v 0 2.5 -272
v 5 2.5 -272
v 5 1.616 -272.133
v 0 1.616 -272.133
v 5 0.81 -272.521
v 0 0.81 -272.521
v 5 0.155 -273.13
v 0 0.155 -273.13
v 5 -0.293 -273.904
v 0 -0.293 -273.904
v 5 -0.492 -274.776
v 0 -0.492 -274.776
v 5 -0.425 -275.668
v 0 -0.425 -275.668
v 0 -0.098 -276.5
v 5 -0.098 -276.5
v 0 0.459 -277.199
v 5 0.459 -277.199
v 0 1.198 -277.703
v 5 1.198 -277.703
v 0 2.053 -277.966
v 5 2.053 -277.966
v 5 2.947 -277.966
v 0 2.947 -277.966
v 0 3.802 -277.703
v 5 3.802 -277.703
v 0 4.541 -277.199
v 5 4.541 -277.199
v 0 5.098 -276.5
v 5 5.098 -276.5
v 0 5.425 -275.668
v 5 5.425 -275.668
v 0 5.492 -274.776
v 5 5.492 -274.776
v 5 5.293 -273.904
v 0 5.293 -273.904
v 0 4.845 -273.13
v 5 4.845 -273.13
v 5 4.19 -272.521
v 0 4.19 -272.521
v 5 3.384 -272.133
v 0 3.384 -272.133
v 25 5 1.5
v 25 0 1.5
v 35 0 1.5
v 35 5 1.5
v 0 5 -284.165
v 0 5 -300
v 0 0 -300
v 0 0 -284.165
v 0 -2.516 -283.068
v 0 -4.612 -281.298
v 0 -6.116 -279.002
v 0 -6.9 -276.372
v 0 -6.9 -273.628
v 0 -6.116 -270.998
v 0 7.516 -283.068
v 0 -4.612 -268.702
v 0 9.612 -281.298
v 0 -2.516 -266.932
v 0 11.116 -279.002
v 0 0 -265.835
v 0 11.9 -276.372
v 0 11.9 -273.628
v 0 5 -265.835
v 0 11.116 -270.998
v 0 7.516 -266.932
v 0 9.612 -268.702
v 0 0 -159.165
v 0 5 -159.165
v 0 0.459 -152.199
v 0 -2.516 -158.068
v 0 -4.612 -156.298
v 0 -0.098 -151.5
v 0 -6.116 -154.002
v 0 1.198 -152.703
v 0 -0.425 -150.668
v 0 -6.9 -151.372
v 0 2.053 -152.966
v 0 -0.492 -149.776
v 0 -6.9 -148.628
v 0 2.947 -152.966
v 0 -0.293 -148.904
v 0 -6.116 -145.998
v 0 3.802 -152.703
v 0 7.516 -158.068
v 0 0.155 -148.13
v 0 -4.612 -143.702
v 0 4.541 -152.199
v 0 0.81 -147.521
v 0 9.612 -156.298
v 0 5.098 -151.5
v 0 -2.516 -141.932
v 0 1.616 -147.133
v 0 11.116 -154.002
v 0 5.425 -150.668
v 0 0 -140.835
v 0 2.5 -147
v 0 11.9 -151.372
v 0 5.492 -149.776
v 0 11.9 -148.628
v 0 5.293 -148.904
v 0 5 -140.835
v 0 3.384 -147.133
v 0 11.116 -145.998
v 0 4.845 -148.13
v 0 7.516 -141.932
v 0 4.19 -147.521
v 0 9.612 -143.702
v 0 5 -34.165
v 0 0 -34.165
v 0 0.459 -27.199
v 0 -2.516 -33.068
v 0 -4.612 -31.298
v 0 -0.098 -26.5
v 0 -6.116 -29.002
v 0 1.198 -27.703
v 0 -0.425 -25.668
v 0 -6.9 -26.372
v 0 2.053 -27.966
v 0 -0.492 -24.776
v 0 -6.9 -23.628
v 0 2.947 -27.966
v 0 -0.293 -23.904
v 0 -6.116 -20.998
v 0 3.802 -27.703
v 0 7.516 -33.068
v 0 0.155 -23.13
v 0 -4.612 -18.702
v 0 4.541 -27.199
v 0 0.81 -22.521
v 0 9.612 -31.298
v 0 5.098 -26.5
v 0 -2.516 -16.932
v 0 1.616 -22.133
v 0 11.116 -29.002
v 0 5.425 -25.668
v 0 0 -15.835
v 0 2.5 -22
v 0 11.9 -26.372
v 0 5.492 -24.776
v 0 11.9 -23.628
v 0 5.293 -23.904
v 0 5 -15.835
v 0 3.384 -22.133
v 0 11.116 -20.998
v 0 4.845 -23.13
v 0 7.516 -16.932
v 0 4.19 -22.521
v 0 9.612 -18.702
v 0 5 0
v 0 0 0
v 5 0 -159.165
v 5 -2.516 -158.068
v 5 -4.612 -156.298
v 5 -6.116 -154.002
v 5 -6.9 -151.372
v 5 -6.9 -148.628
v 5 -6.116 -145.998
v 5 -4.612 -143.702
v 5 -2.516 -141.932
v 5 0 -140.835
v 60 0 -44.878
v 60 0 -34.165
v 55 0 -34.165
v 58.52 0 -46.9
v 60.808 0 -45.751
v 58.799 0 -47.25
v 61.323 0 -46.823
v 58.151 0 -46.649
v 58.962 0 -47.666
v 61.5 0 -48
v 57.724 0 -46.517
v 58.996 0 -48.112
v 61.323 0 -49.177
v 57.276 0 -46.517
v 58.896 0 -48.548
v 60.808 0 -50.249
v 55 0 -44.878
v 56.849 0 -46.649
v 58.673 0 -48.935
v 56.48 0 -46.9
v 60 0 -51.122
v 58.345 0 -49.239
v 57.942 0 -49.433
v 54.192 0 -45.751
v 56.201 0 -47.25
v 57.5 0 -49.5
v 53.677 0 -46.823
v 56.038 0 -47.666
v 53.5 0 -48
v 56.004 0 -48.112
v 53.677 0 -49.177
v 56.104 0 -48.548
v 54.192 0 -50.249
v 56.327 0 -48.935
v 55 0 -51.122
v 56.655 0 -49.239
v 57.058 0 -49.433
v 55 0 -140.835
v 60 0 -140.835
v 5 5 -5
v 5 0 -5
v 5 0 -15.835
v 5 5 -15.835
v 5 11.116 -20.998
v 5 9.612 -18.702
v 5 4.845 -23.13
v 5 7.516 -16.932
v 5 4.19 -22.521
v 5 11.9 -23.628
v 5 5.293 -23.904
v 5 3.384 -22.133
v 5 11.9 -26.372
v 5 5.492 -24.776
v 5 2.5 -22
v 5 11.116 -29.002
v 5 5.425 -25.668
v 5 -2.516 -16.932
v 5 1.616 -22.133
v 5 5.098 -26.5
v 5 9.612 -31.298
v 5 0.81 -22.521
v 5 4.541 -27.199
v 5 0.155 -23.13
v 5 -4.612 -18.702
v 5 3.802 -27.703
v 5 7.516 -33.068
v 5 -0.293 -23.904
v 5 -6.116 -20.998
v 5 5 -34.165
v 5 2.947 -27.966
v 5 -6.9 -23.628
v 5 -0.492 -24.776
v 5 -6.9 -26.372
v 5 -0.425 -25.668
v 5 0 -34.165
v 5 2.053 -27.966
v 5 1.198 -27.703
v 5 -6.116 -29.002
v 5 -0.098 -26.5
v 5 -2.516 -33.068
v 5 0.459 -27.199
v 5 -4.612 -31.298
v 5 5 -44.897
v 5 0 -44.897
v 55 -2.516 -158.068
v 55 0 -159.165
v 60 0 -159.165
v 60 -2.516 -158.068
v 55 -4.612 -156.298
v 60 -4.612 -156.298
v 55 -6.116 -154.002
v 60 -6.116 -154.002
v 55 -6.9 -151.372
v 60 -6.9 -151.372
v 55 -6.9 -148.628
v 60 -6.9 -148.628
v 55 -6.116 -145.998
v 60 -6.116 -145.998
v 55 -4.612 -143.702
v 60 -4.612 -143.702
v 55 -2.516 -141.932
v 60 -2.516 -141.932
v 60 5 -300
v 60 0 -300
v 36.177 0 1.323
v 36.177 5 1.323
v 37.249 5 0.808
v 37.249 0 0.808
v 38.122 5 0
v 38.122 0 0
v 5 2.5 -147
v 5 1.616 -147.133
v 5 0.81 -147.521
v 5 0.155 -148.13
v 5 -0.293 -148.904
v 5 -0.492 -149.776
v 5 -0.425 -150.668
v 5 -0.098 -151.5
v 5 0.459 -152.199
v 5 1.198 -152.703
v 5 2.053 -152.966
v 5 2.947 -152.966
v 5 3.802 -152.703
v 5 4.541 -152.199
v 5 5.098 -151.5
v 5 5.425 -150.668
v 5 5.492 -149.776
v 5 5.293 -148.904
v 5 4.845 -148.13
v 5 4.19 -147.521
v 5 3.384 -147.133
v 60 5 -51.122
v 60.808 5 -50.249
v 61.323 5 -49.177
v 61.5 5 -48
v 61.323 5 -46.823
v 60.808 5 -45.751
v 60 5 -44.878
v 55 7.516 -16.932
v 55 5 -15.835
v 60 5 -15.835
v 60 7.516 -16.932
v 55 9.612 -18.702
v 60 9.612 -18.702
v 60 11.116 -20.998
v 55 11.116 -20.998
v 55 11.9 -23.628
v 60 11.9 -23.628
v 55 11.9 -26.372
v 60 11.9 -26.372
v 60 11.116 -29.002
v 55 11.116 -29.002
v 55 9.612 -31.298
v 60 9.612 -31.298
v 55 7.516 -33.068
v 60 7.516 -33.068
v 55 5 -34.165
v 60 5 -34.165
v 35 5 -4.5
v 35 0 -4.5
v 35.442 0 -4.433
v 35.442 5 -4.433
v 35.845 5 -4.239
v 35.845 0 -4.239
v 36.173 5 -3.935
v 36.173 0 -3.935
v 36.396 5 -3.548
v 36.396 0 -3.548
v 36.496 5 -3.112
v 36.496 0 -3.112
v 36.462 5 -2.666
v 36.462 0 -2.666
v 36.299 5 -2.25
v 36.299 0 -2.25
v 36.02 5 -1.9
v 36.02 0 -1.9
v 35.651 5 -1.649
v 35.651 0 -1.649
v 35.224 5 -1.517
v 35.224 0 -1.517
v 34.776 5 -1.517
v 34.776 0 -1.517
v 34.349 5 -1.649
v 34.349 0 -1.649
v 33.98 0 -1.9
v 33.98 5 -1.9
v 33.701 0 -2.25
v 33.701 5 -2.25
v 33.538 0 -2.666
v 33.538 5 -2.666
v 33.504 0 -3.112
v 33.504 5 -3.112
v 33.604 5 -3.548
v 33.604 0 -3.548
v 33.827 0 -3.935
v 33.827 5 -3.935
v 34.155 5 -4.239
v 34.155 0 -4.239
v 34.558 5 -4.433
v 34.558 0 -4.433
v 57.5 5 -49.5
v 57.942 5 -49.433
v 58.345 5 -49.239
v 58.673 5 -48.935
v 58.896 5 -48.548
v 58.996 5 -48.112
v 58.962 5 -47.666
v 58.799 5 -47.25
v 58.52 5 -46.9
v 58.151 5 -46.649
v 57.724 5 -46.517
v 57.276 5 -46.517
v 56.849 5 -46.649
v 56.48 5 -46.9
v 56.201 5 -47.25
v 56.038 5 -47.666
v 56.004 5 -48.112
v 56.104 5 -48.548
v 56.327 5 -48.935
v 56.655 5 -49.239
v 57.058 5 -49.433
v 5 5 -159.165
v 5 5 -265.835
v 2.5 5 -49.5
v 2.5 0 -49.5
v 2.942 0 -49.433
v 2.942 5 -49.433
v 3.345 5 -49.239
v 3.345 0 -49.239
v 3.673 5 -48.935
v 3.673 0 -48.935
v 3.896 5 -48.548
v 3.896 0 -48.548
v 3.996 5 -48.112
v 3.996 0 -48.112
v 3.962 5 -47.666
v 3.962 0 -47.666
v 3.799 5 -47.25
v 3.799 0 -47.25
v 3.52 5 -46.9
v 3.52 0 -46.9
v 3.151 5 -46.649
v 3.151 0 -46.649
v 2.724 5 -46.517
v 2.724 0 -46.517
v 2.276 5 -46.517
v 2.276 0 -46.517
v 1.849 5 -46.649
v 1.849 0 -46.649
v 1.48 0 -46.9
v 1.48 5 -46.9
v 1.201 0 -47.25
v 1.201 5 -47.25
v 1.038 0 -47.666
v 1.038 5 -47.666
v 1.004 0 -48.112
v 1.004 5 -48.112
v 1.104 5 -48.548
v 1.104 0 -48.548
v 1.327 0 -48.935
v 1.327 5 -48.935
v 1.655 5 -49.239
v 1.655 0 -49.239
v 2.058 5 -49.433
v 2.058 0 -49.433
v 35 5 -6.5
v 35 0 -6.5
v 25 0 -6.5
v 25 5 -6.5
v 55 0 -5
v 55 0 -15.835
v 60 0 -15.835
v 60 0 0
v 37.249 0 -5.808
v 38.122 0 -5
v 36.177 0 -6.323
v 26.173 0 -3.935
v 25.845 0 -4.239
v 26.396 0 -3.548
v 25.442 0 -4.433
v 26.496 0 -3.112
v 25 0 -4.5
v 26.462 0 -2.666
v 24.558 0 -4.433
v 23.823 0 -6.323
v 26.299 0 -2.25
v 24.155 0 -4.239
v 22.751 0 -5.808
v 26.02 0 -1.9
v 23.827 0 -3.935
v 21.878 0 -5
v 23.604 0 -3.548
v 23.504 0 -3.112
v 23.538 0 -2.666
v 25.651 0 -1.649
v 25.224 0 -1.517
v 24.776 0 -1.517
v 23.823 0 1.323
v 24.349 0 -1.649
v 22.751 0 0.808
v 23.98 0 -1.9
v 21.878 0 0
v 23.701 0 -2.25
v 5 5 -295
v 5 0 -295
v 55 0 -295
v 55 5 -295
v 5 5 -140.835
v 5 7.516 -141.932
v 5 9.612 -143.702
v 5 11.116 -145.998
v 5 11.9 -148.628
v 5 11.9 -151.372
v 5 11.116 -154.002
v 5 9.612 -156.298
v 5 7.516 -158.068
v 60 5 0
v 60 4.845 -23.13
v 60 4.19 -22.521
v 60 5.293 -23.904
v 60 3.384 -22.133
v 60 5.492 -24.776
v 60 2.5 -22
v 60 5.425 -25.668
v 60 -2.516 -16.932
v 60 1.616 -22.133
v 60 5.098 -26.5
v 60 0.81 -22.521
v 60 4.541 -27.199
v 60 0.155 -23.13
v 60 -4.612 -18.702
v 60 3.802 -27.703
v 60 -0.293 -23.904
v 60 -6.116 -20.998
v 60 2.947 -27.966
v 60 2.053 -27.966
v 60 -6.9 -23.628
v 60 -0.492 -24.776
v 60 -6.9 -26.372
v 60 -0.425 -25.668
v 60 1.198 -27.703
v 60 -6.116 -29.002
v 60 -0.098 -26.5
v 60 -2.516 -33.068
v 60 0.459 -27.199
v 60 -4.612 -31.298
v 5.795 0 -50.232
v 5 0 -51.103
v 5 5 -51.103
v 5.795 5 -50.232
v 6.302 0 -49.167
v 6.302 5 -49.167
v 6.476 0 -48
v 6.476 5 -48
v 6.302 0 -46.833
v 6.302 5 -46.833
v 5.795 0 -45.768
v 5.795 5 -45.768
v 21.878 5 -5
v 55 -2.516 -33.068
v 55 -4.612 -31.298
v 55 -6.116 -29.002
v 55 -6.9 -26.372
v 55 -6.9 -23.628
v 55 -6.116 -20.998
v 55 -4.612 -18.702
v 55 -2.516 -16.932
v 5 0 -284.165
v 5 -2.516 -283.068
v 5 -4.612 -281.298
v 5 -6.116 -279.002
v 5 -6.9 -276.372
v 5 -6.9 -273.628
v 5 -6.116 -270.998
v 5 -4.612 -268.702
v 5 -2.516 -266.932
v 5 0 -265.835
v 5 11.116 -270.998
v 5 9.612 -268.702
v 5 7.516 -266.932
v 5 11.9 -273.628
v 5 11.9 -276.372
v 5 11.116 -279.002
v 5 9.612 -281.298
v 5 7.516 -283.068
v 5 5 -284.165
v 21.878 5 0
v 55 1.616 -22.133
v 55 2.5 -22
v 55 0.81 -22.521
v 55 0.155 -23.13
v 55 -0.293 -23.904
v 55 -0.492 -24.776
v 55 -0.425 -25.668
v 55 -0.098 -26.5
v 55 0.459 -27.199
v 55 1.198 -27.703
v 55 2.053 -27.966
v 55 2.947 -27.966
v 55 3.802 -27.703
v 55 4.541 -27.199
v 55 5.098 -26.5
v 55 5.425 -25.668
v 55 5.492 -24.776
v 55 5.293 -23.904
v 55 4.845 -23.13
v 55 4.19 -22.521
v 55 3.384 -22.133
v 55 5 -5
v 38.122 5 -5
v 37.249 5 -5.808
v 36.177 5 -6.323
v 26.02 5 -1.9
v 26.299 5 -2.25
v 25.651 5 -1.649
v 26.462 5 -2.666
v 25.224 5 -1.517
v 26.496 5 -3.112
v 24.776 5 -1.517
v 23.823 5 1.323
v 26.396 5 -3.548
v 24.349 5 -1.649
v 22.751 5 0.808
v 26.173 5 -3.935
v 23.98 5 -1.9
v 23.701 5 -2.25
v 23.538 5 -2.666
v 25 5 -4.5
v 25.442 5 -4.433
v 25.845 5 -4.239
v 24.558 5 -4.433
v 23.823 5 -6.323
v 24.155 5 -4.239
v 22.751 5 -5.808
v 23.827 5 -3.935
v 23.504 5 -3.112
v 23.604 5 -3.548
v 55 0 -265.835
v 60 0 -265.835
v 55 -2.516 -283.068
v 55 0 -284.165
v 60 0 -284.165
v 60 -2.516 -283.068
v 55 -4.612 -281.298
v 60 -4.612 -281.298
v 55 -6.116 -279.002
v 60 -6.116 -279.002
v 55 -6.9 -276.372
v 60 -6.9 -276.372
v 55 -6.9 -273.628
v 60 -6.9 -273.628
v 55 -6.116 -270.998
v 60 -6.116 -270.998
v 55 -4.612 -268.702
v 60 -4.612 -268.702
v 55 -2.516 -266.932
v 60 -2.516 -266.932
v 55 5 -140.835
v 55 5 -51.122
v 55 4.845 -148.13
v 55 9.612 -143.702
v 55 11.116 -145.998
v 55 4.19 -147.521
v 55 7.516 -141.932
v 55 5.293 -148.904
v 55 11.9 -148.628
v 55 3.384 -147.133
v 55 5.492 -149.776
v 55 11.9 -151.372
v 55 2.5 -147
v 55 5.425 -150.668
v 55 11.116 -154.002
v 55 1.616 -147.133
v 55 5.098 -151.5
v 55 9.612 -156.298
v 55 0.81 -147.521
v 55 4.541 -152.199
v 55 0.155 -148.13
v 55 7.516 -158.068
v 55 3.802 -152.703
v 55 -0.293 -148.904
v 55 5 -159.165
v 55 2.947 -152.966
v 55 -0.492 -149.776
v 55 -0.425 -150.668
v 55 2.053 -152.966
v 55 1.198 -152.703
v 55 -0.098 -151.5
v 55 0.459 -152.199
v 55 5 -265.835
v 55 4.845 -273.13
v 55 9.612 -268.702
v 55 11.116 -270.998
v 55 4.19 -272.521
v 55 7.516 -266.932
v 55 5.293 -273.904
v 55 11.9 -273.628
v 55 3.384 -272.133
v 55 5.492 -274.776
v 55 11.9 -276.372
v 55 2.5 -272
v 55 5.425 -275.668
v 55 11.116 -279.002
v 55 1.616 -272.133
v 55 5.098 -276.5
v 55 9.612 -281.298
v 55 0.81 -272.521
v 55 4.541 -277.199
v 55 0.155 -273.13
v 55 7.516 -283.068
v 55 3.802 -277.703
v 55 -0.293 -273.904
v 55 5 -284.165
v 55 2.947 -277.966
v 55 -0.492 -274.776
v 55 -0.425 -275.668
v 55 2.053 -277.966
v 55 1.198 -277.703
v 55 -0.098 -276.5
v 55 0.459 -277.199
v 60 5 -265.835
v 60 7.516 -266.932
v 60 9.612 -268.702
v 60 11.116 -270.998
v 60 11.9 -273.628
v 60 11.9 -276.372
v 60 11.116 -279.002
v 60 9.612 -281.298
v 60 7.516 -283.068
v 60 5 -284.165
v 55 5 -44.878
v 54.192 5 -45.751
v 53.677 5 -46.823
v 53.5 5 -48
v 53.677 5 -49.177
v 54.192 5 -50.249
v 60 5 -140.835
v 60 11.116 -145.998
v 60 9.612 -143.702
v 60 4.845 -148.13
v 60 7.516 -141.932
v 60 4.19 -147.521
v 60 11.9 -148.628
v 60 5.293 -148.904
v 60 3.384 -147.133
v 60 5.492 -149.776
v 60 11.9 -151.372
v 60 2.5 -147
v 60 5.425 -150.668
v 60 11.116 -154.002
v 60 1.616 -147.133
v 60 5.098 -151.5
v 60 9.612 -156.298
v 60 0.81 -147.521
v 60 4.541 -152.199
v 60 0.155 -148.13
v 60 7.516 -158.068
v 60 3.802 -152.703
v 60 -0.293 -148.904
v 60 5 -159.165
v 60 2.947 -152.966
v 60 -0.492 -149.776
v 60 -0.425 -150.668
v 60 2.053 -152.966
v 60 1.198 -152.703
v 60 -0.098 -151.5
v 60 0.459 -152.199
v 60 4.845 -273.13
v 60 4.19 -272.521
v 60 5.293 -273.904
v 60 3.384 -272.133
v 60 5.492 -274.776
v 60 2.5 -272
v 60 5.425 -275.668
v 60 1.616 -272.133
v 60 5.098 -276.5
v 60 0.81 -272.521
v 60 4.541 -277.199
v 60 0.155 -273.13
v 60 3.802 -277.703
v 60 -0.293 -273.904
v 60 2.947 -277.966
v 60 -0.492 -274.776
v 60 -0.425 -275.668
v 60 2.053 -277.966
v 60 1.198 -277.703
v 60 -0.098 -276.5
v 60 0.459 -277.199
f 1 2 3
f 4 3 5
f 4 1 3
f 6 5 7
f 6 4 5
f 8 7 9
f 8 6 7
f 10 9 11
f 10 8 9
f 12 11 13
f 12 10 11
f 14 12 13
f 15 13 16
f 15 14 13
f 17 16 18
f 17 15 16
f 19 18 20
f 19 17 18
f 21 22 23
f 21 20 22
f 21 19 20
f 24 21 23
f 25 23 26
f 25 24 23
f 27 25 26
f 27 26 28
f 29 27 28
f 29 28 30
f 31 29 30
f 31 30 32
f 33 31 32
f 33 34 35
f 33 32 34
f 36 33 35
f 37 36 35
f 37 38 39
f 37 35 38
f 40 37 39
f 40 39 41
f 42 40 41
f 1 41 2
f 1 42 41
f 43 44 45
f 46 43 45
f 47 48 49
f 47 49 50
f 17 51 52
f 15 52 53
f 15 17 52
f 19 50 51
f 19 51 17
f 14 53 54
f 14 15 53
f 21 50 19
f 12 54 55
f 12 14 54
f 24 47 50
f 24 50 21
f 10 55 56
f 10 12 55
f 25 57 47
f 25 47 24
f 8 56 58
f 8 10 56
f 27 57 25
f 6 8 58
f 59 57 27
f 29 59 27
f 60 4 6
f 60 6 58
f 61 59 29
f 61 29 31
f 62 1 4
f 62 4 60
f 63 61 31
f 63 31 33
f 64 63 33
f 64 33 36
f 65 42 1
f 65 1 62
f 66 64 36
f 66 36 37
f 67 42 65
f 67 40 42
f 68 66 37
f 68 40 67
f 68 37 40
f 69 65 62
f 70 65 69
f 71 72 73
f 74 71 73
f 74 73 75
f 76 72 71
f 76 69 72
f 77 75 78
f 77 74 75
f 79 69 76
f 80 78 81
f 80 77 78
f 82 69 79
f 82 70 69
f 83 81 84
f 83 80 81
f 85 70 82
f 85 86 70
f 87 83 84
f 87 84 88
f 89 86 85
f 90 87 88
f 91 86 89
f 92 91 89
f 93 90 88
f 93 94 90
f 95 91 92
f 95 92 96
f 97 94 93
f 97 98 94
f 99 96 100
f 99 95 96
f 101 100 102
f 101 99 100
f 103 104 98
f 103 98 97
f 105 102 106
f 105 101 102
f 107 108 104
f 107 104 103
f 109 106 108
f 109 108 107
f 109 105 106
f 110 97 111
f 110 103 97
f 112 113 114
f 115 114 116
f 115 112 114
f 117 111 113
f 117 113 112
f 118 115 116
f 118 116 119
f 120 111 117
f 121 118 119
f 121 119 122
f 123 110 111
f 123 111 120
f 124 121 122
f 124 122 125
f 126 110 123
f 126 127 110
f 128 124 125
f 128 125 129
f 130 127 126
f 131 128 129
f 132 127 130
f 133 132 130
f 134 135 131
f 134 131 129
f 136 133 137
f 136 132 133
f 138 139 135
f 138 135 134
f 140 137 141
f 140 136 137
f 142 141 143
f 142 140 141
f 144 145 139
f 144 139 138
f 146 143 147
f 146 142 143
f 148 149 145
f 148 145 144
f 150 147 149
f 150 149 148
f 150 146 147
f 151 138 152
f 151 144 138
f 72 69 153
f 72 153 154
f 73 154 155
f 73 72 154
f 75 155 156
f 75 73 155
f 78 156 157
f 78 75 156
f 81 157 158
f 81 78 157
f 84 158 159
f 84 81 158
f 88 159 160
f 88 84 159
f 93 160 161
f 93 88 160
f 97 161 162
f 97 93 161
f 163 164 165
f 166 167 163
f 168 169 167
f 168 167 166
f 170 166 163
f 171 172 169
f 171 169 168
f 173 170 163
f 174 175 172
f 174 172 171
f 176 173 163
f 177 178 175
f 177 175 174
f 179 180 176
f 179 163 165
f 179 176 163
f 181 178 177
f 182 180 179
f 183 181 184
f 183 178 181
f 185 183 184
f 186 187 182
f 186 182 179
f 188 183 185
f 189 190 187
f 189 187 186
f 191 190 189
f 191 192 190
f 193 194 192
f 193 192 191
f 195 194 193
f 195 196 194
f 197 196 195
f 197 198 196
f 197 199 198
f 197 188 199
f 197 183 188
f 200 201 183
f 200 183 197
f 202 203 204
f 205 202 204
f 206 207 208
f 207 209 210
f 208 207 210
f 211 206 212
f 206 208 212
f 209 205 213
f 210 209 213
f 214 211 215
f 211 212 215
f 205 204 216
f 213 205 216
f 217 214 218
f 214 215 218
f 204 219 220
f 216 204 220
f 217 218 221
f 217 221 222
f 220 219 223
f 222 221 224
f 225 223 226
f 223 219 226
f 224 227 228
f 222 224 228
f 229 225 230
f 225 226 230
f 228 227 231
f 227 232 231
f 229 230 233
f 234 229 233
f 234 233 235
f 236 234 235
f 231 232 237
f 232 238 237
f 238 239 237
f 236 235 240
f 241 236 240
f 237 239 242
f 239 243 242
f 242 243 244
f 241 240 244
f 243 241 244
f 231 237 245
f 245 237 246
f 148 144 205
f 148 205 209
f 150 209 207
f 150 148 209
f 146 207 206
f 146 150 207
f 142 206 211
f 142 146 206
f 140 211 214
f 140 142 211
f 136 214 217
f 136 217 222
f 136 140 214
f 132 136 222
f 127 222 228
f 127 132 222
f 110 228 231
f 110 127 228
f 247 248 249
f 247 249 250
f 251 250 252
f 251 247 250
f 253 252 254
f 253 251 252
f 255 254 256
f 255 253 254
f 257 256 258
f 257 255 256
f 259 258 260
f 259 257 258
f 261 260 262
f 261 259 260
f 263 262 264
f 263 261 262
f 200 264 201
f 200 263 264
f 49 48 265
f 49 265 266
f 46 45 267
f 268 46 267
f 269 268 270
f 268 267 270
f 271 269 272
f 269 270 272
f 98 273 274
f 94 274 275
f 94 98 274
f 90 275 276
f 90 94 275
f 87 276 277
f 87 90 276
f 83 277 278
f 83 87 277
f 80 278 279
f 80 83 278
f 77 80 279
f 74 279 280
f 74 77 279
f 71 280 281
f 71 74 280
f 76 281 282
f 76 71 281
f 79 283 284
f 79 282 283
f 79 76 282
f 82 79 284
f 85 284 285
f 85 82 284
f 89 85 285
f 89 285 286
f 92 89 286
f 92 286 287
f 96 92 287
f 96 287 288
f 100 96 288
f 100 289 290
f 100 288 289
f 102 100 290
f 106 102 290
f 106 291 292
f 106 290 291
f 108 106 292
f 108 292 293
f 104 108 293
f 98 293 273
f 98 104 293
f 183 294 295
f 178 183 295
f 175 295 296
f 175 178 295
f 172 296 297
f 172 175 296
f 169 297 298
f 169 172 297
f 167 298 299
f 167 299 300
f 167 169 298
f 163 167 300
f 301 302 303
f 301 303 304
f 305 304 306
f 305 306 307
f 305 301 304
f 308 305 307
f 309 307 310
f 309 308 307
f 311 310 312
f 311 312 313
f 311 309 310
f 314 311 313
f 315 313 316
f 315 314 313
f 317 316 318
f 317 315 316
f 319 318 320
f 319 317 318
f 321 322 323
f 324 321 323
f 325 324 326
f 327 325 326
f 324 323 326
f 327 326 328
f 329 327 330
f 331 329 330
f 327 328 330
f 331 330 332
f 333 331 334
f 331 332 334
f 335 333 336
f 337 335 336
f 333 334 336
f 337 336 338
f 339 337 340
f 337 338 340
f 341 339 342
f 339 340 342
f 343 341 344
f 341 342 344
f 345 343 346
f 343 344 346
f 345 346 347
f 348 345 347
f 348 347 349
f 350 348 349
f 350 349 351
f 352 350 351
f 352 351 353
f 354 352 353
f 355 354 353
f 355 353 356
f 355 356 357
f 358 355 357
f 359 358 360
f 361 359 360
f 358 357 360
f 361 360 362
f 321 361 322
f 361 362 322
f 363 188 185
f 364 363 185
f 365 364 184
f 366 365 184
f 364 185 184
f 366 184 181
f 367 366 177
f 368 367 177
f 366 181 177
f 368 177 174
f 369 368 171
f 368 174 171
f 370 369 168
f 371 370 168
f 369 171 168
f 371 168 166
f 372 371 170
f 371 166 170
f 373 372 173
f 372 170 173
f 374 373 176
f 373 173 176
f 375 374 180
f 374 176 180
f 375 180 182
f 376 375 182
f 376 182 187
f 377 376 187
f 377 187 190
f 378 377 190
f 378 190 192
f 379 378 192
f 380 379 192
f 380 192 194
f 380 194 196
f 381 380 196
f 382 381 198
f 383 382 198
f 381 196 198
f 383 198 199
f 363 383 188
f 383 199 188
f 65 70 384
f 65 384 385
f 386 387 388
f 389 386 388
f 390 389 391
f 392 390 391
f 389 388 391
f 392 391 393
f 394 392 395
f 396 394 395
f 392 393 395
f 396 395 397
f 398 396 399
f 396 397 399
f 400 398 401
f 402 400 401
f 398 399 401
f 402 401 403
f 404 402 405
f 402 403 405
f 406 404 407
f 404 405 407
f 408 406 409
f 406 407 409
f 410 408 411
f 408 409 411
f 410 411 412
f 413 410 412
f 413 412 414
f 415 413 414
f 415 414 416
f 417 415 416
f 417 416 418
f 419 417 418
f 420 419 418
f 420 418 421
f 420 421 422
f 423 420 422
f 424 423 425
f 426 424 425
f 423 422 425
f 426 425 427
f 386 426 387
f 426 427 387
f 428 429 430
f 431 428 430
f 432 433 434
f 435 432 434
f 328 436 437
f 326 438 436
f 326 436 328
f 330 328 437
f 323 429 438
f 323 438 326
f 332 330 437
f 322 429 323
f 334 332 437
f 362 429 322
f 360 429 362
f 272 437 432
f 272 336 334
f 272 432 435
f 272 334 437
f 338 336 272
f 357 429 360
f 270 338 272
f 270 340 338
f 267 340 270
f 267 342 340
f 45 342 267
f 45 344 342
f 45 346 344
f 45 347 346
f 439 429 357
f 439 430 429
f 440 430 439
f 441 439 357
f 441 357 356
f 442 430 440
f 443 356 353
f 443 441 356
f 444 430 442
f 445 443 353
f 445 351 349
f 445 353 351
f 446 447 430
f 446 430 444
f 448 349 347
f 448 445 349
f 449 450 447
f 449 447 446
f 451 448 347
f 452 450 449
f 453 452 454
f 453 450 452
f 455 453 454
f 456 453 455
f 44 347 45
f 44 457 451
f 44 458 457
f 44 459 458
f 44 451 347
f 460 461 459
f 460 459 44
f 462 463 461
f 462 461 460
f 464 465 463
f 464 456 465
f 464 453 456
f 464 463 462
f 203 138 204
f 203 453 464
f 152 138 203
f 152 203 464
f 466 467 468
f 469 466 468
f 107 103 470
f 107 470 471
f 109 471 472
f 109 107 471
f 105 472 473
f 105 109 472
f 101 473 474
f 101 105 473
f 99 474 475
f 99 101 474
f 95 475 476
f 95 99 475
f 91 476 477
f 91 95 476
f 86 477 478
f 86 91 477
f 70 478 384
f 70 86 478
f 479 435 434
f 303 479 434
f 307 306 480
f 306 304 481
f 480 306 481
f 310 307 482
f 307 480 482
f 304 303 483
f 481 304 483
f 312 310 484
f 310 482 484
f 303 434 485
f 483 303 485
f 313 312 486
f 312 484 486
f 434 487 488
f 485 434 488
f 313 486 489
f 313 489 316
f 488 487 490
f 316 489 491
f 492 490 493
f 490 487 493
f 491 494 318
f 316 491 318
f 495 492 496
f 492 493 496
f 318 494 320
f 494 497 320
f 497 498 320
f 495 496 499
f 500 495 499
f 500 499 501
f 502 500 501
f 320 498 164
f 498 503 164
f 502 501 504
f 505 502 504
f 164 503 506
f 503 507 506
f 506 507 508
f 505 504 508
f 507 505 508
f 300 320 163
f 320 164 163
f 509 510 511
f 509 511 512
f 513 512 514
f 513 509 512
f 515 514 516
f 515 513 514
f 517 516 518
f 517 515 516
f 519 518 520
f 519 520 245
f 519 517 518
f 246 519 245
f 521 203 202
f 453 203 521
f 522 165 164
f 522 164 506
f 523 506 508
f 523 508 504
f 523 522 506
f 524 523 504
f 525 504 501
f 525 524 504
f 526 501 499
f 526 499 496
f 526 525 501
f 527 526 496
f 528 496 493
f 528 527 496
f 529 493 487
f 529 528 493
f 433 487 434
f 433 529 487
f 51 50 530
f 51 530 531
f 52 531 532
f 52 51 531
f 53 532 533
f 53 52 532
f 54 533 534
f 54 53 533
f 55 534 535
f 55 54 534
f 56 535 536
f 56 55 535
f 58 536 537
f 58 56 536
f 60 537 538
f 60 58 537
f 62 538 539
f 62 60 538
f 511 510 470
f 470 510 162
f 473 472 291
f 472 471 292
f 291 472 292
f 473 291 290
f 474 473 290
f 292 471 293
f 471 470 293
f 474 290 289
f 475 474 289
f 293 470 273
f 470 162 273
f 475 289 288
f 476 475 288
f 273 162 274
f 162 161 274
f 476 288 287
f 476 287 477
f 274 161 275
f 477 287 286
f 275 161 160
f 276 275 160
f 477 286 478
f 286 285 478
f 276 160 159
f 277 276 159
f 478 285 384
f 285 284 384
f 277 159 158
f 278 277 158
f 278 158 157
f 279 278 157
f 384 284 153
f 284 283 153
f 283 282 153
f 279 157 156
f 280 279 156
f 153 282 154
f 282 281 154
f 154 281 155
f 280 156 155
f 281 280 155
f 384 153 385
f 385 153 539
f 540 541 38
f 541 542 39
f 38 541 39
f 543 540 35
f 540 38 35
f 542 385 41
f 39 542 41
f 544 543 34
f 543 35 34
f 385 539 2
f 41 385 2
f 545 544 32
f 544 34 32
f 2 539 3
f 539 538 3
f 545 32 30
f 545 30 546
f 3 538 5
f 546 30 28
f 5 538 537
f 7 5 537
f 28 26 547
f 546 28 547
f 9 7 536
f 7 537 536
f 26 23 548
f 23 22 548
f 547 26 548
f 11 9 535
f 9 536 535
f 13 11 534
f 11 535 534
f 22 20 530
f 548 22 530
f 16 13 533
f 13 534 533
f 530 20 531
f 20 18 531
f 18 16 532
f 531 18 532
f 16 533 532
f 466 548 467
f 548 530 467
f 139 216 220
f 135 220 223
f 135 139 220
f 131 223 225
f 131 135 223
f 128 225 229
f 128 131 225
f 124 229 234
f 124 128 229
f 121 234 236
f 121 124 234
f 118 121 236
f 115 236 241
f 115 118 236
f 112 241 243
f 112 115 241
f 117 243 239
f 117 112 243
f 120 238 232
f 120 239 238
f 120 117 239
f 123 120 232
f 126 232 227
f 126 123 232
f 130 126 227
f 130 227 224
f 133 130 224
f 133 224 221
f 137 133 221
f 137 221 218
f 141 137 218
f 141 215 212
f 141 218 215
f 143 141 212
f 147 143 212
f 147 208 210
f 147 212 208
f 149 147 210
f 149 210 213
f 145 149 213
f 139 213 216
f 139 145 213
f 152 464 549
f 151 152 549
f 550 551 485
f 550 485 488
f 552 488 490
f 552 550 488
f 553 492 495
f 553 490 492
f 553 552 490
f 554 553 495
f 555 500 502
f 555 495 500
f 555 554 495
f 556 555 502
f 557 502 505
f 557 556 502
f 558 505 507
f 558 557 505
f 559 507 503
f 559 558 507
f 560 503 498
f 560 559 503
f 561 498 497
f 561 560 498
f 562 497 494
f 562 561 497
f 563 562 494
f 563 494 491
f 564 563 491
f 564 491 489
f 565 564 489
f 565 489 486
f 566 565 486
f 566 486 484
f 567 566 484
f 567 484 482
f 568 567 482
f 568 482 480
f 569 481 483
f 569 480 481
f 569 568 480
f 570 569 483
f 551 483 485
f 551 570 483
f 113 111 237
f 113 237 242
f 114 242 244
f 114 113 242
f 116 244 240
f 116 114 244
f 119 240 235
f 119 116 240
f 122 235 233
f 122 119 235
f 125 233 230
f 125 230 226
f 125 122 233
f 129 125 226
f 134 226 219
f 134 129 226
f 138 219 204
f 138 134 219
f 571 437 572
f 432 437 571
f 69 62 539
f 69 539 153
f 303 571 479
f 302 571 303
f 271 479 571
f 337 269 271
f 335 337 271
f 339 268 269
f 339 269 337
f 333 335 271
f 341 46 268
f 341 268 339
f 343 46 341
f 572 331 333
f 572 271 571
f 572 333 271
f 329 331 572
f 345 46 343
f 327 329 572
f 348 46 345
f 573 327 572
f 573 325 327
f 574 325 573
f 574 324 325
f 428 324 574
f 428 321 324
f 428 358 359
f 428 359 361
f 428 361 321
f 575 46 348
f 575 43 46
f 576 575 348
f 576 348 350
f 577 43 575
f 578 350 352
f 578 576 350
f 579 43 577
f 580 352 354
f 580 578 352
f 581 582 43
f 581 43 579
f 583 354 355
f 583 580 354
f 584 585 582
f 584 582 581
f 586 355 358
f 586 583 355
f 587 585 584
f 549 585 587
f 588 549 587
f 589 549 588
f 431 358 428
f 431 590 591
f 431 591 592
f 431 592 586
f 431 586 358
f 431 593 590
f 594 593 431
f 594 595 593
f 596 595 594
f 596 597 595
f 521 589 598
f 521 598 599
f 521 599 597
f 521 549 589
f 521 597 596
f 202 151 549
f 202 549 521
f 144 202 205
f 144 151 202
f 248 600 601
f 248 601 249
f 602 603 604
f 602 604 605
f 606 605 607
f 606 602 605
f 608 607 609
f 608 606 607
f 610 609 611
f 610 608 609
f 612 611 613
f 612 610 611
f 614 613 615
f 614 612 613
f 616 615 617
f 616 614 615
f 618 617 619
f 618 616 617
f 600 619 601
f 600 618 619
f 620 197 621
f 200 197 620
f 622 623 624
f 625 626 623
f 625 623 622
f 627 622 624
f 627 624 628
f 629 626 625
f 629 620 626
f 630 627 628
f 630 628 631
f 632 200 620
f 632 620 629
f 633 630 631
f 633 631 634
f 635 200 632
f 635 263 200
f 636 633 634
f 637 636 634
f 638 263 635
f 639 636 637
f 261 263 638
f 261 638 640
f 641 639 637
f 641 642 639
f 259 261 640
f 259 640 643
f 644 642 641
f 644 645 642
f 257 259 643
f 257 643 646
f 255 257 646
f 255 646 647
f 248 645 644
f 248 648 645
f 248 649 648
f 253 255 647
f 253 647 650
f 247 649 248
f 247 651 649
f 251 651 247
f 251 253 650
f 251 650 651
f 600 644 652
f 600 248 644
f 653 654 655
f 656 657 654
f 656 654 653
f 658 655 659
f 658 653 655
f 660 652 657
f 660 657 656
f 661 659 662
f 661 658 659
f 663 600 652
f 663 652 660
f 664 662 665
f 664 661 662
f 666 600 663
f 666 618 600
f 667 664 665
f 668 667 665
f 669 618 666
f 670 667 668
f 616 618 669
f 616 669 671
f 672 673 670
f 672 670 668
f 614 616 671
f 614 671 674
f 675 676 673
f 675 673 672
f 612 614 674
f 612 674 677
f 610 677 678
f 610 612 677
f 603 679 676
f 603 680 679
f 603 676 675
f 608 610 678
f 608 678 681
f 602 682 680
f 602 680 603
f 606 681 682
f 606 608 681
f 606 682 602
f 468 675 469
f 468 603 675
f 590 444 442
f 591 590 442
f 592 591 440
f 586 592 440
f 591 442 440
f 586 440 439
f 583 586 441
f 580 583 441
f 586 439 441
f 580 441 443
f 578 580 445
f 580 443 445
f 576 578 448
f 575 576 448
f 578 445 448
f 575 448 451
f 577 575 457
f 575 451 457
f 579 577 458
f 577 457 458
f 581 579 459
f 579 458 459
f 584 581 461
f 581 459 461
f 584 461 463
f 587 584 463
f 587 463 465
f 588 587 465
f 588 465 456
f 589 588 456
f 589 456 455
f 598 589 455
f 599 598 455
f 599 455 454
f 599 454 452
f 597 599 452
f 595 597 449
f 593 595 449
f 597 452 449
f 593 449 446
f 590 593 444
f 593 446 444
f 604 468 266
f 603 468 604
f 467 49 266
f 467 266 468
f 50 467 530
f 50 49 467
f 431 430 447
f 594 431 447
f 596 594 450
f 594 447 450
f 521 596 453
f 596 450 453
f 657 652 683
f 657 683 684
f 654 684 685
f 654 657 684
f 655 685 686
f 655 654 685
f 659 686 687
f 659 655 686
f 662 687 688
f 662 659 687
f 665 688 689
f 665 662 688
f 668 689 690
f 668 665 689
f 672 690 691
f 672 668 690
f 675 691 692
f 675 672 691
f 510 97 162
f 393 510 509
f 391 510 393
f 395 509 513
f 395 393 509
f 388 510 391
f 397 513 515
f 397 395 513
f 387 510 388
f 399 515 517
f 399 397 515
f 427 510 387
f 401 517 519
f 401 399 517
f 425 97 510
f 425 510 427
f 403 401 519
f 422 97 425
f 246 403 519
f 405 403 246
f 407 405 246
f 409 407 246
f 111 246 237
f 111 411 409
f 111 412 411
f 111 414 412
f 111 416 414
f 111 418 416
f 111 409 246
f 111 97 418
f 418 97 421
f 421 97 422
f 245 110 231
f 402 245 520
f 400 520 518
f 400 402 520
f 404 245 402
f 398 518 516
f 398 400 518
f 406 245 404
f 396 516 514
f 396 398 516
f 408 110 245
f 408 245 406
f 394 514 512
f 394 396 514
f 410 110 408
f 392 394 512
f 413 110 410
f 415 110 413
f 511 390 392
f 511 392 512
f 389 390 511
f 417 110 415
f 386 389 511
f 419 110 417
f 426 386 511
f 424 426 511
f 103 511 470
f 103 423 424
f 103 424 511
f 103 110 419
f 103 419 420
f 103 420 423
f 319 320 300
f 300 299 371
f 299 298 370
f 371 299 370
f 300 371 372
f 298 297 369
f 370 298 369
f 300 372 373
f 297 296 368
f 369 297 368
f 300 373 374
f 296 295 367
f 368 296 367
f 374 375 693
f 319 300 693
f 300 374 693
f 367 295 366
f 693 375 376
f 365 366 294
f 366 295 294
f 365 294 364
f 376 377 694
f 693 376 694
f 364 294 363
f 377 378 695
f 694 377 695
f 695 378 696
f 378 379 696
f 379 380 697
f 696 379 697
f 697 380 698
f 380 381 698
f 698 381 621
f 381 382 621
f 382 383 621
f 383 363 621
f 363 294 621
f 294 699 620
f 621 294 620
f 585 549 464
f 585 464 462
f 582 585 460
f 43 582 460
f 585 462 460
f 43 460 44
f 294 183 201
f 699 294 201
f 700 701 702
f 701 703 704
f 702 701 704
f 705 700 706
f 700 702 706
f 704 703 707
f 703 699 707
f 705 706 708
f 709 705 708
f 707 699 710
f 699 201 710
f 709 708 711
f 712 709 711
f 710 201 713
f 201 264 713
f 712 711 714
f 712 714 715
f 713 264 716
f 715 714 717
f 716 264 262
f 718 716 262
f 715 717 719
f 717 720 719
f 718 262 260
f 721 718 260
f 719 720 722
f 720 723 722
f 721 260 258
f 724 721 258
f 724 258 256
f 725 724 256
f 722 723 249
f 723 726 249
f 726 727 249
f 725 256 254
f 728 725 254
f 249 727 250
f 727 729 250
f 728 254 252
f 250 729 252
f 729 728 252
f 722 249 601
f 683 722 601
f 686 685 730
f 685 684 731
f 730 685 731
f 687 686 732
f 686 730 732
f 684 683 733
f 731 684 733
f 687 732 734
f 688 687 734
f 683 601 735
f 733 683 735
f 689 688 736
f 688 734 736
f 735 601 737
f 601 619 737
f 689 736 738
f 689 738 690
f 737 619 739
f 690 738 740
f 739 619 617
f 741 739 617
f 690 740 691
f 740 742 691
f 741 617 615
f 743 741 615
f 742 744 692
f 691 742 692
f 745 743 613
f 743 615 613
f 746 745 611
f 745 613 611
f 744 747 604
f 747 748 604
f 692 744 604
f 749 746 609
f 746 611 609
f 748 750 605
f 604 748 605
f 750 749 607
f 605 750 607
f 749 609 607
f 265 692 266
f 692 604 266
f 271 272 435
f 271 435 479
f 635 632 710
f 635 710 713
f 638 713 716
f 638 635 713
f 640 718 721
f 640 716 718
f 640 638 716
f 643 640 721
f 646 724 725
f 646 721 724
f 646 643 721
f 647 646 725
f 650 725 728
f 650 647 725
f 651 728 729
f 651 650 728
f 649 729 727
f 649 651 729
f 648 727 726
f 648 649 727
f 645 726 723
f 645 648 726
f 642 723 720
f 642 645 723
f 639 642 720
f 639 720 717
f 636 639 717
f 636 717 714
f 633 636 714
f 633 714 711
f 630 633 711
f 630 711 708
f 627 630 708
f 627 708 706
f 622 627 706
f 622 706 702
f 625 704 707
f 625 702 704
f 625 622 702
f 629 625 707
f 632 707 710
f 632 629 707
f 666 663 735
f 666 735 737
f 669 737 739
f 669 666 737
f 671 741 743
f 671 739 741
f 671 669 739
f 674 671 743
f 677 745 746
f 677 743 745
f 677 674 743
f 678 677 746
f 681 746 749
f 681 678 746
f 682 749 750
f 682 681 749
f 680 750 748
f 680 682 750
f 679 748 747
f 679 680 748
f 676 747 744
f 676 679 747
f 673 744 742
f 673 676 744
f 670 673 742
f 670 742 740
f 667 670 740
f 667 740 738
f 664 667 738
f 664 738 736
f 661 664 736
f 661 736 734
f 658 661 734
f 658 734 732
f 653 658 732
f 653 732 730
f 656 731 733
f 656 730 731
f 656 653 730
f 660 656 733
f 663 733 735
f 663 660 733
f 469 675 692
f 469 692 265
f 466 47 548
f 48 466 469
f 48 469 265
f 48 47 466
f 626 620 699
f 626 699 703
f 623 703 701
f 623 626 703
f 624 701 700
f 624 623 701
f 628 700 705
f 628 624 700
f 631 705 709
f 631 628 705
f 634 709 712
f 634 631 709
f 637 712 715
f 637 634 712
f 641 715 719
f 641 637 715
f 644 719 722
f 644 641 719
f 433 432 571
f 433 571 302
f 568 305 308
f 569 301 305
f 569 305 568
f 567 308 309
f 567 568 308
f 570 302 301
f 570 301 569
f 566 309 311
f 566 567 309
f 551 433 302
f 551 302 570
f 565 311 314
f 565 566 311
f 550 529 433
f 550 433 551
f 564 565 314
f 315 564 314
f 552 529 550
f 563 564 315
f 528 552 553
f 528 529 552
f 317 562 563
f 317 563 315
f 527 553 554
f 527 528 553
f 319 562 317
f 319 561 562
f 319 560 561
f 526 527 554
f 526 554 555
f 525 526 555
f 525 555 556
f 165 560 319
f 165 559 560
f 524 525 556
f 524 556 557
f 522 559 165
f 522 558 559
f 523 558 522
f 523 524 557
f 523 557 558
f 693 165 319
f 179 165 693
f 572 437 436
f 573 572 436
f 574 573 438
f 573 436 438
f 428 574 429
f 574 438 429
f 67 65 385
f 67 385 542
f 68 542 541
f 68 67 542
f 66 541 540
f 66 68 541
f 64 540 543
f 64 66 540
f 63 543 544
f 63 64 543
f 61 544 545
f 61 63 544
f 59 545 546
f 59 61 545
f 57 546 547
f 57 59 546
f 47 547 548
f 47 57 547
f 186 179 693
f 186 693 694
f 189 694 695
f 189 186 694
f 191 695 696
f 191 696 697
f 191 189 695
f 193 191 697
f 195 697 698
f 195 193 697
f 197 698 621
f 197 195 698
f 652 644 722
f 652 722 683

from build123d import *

# Parameters (mm, degrees)
SKETCH2_R               = 3
BOSS_EXTRUDE1_DEPTH     = 180
CUT_EXTRUDE1_DEPTH      = 351.0628515
CUT_EXTRUDE1_DEPTH_BACK = 351.0628515
SKETCH3_W               = 50
SKETCH3_H               = 290
CUT_EXTRUDE2_DEPTH      = 351.0628515
CUT_EXTRUDE2_DEPTH_BACK = 351.0628515
SKETCH5_W               = 159.12266695
SKETCH5_H               = 409.499518343
SKETCH8_R               = 4
BOSS_EXTRUDE3_DEPTH     = 5
SKETCH9_R               = 1.5
CUT_EXTRUDE4_DEPTH      = 5


with BuildPart() as part:
    # Sketch2 → Boss-Extrude1 (new body)
    with BuildSketch(Plane(origin=(0, 0, 0), x_dir=(0, 0, -1), z_dir=(1, 0, 0))):
        with BuildLine():
            Line((159.16515139, 5), (265.83484861, 5))
            ThreePointArc((265.83484861, 5), (275, 12), (284.16515139, 5))
            Line((284.16515139, 5), (300, 5))
            Line((300, 5), (300, 0))
            Line((300, 0), (284.16515139, 0))
            ThreePointArc((284.16515139, 0), (275, -7), (265.83484861, 0))
            Line((265.83484861, 0), (159.16515139, 0))
            ThreePointArc((159.16515139, 0), (150, -7), (140.83484861, 0))
            Line((140.83484861, 0), (34.16515139, 0))
            ThreePointArc((34.16515139, 0), (25, -7), (15.83484861, 0))
            Line((15.83484861, 0), (0, 0))
            Line((0, 0), (0, 5))
            Line((0, 5), (15.83484861, 5))
            ThreePointArc((15.83484861, 5), (25, 12), (34.16515139, 5))
            Line((34.16515139, 5), (140.83484861, 5))
            ThreePointArc((140.83484861, 5), (150, 12), (159.16515139, 5))
        make_face()
        with Locations(Location((150, 2.5, 0), (0, 0, 180))):
            Circle(SKETCH2_R, mode=Mode.SUBTRACT)
        with Locations(Location((275, 2.5, 0), (0, 0, 180))):
            Circle(SKETCH2_R, mode=Mode.SUBTRACT)
        with Locations(Location((25, 2.5, 0), (0, 0, 180))):
            Circle(SKETCH2_R, mode=Mode.SUBTRACT)
    extrude(amount=BOSS_EXTRUDE1_DEPTH)

    # Sketch3 → Cut-Extrude1 (cut, two sides: drawn at the far end of the back side and taken through both)
    with BuildSketch(Plane(origin=(0, 5, 0), x_dir=(1, 0, 0), z_dir=(0, 1, 0)).offset(-CUT_EXTRUDE1_DEPTH_BACK)):
        with Locations((150, 150)):
            Rectangle(SKETCH3_W, SKETCH3_H)
        with Locations((90, 150)):
            Rectangle(SKETCH3_W, SKETCH3_H)
        with Locations((30, 150)):
            Rectangle(SKETCH3_W, SKETCH3_H)
    extrude(amount=CUT_EXTRUDE1_DEPTH + CUT_EXTRUDE1_DEPTH_BACK, mode=Mode.SUBTRACT)

    # Sketch5 → Cut-Extrude2 (cut, two sides: drawn at the far end of the back side and taken through both)
    with BuildSketch(Plane(origin=(0, 5, 0), x_dir=(1, 0, 0), z_dir=(0, 1, 0)).offset(-CUT_EXTRUDE2_DEPTH_BACK)):
        with Locations((139.561333475, 139.935321467)):
            Rectangle(SKETCH5_W, SKETCH5_H)
    extrude(amount=CUT_EXTRUDE2_DEPTH + CUT_EXTRUDE2_DEPTH_BACK, mode=Mode.SUBTRACT)

    # Sketch8 → Boss-Extrude3 (add)
    with BuildSketch(Plane(origin=(0, 0, 0), x_dir=(-1, 0, 0), z_dir=(0, -1, 0))):
        with Locations((-57.5, 48)):
            Circle(SKETCH8_R)
        with BuildLine():
            Line((-25, -1.5), (-35, -1.5))
            ThreePointArc((-35, -1.5), (-39, 2.5), (-35, 6.5))
            Line((-35, 6.5), (-25, 6.5))
            ThreePointArc((-25, 6.5), (-21, 2.5), (-25, -1.5))
        make_face()
        with BuildLine():
            Line((-2.475564239, 44), (-2.475564239, 52))
            ThreePointArc((-2.475564239, 52), (-6.475564239, 48), (-2.475564239, 44))
        make_face()
    extrude(amount=-BOSS_EXTRUDE3_DEPTH)

    # Sketch9 → Cut-Extrude4 (cut)
    with BuildSketch(Plane(origin=(0, 0, 0), x_dir=(-1, 0, 0), z_dir=(0, -1, 0))):
        with Locations(Location((-25, 3, 0), (0, 0, 90))):
            Circle(SKETCH9_R)
        with Locations(Location((-35, 3, 0), (0, 0, 90))):
            Circle(SKETCH9_R)
        with Locations(Location((-57.5, 48, 0), (0, 0, 90))):
            Circle(SKETCH9_R)
        with Locations(Location((-2.5, 48, 0), (0, 0, 90))):
            Circle(SKETCH9_R)
    extrude(amount=-CUT_EXTRUDE4_DEPTH, mode=Mode.SUBTRACT)


solid = part.part
